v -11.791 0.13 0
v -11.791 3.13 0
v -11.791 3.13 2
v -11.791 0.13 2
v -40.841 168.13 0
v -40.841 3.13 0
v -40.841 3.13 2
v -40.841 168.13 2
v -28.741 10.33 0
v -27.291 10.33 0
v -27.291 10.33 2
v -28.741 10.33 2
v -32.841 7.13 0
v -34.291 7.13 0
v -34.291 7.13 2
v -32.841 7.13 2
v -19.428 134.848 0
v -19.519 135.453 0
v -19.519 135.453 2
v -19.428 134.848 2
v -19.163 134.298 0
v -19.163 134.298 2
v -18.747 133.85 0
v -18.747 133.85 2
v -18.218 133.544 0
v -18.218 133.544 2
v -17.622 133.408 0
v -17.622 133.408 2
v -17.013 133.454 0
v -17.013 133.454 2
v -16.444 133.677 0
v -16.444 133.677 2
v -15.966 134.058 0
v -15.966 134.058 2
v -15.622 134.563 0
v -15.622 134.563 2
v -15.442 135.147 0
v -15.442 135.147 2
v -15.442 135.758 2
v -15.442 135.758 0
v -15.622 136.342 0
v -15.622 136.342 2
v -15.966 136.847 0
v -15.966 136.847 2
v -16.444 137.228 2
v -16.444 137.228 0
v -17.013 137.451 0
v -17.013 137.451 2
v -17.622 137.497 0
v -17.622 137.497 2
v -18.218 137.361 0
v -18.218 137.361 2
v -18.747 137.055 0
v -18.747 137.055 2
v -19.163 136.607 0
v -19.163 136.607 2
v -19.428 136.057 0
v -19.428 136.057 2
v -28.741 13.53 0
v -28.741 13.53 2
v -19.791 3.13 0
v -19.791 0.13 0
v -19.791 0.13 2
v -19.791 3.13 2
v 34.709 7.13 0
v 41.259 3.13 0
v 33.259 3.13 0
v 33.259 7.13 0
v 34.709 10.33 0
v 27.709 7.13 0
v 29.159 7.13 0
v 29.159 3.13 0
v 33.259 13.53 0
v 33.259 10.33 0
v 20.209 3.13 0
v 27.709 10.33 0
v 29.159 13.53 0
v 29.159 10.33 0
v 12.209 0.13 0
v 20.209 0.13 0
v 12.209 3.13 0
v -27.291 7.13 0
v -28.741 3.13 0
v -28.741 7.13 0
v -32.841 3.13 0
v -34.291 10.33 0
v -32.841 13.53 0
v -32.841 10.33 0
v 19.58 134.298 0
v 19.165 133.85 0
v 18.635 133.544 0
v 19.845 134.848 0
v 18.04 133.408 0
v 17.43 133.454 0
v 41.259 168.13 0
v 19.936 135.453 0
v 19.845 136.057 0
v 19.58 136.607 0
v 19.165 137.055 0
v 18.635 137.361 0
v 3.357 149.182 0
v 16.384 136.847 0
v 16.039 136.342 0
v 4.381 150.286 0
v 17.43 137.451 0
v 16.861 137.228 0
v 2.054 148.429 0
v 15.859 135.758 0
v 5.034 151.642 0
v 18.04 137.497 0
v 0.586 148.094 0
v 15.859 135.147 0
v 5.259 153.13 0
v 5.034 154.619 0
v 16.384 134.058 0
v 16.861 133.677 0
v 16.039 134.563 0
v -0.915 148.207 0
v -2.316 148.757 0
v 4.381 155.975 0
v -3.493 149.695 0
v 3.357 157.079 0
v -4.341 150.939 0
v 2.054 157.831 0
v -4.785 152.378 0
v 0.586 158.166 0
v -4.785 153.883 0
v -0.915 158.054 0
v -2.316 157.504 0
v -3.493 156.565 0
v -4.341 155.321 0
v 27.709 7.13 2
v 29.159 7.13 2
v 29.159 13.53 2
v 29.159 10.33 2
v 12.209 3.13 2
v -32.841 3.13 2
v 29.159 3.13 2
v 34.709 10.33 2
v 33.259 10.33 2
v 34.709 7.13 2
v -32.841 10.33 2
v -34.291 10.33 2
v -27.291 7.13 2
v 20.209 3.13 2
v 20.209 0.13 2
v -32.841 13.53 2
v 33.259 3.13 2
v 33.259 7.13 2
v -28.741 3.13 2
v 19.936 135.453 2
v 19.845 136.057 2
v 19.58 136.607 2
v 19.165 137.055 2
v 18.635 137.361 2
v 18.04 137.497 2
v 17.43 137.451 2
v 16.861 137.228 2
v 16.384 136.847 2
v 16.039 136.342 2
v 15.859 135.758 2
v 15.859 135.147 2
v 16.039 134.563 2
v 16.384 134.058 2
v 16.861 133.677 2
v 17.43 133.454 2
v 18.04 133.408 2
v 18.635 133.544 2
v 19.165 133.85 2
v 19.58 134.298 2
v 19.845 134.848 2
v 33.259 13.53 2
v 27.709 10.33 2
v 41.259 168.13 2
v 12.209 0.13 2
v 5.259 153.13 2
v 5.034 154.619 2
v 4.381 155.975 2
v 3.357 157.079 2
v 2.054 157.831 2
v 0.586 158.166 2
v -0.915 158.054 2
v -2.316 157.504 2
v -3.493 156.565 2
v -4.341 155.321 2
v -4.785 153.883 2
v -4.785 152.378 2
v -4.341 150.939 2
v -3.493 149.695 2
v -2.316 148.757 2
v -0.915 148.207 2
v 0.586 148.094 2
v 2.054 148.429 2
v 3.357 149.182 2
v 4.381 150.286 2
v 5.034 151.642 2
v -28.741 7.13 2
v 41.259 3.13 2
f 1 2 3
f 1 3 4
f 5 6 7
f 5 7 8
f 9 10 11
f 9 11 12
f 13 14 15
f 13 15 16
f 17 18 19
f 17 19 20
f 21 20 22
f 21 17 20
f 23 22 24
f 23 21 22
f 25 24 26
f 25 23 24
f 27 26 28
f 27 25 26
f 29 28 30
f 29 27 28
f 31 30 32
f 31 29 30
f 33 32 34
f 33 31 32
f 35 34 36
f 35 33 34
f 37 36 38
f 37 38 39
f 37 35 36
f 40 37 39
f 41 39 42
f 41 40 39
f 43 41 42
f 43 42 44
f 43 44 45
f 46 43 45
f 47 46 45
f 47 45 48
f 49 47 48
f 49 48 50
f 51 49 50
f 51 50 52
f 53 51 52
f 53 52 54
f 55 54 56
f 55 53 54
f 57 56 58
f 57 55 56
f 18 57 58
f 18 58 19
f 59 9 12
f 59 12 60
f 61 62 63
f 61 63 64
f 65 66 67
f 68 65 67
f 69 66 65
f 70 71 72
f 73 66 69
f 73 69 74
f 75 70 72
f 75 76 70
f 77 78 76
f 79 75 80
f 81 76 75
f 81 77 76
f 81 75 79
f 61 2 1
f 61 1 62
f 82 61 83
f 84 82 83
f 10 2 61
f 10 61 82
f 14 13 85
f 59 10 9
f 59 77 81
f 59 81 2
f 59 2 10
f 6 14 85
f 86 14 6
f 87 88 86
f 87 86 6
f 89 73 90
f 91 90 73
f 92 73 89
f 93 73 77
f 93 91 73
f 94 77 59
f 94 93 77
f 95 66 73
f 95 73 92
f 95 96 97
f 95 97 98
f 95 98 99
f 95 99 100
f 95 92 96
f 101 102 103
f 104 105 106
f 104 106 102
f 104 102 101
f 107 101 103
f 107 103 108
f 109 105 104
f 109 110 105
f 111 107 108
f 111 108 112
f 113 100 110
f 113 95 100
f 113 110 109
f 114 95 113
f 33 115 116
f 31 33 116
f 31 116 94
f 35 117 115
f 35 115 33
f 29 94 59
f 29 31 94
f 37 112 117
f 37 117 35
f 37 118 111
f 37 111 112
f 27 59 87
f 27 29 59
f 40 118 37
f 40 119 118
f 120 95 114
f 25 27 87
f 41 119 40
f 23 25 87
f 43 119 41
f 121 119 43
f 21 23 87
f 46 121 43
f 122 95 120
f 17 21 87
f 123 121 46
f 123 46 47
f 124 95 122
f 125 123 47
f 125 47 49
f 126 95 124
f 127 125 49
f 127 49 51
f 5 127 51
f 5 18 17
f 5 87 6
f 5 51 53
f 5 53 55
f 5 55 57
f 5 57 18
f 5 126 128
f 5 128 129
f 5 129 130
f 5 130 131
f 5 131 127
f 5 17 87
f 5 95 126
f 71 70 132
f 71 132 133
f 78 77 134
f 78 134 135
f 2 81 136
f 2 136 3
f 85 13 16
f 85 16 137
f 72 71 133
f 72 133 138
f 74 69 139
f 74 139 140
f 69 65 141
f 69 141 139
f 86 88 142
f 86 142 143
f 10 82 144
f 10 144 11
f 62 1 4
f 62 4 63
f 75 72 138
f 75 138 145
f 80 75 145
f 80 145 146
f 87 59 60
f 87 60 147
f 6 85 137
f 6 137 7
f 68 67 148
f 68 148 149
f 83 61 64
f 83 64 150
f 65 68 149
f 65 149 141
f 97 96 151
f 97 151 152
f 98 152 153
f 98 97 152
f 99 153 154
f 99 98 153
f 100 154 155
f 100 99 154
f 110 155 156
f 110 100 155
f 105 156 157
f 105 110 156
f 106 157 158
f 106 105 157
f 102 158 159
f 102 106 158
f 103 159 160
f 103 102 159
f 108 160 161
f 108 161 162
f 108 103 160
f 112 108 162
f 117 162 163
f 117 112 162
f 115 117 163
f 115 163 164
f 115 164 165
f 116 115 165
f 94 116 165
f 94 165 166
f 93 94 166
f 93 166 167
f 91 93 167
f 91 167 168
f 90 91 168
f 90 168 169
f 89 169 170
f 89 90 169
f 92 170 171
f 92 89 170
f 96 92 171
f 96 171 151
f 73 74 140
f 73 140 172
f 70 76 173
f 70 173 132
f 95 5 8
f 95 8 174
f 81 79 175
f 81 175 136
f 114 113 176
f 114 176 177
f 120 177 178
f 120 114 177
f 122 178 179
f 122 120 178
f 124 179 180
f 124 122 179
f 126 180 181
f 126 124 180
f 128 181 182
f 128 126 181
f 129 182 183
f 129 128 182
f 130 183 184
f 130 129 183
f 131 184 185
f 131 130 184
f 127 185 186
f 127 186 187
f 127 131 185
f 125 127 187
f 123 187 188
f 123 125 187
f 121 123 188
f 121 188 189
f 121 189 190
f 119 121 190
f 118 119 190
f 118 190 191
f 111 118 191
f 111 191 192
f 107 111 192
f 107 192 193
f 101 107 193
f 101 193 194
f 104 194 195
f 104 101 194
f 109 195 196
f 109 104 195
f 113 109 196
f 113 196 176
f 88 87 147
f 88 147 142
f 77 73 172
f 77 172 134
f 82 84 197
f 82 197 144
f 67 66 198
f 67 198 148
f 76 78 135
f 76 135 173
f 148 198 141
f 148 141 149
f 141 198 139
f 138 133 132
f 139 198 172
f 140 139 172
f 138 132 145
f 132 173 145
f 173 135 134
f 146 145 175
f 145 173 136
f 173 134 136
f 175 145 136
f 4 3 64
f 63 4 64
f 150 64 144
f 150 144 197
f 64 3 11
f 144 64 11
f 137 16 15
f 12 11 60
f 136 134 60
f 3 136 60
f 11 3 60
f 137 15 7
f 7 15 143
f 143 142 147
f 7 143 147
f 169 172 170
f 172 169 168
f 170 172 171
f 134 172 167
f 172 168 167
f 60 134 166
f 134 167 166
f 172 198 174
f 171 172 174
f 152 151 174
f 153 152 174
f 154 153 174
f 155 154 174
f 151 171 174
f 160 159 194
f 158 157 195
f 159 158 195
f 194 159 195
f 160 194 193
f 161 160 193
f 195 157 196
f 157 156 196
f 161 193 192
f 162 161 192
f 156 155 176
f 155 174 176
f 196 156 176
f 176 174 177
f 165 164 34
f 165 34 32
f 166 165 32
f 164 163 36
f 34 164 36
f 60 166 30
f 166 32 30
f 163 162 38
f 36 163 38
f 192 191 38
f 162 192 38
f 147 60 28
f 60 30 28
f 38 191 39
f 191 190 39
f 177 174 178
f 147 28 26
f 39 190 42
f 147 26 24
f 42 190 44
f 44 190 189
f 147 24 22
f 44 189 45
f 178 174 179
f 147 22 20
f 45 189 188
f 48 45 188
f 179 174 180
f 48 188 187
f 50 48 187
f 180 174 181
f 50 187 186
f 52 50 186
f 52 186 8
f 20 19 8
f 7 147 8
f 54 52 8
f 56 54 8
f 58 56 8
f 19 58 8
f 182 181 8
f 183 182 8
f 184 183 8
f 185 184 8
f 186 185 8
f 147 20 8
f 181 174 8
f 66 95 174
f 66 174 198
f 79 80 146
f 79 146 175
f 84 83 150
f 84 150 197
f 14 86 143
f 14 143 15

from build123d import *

# Parameters (mm, degrees)
SKETCH_1_R      = 5.05
SKETCH_1_R_2    = 2.05
EXTRUDE_1_DEPTH = 2


with BuildPart() as part:
    # 草图1 → 凸台-拉伸1 (new body)
    with BuildSketch(Plane.XY):
        Polygon((-28.741188564, 3.13029316), (-28.741188564, 7.13029316), (-27.291188564, 7.13029316), (-27.291188564, 10.33029316), (-28.741188564, 10.33029316), (-28.741188564, 13.53029316), (-32.841188564, 13.53029316), (-32.841188564, 10.33029316), (-34.291188564, 10.33029316), (-34.291188564, 7.13029316), (-32.841188564, 7.13029316), (-32.841188564, 3.13029316), (-40.841188564, 3.13029316), (-40.841188564, 168.13029316), (41.258811436, 168.13029316), (41.258811436, 3.13029316), (33.258811436, 3.13029316), (33.258811436, 7.13029316), (34.708811436, 7.13029316), (34.708811436, 10.33029316), (33.258811436, 10.33029316), (33.258811436, 13.53029316), (29.158811436, 13.53029316), (29.158811436, 10.33029316), (27.708811436, 10.33029316), (27.708811436, 7.13029316), (29.158811436, 7.13029316), (29.158811436, 3.13029316), (20.208811436, 3.13029316), (20.208811436, 0.13029316), (12.208811436, 0.13029316), (12.208811436, 3.13029316), (-11.791188564, 3.13029316), (-11.791188564, 0.13029316), (-19.791188564, 0.13029316), (-19.791188564, 3.13029316), align=None)
        with Locations((0.208811436, 153.13029316)):
            Circle(SKETCH_1_R, mode=Mode.SUBTRACT)
        with Locations((17.886480965, 135.45262363)):
            Circle(SKETCH_1_R_2, mode=Mode.SUBTRACT)
        with Locations(Location((-17.468858094, 135.45262363, 0), (0, 0, 180))):
            Circle(SKETCH_1_R_2, mode=Mode.SUBTRACT)
    extrude(amount=EXTRUDE_1_DEPTH)


solid = part.part
